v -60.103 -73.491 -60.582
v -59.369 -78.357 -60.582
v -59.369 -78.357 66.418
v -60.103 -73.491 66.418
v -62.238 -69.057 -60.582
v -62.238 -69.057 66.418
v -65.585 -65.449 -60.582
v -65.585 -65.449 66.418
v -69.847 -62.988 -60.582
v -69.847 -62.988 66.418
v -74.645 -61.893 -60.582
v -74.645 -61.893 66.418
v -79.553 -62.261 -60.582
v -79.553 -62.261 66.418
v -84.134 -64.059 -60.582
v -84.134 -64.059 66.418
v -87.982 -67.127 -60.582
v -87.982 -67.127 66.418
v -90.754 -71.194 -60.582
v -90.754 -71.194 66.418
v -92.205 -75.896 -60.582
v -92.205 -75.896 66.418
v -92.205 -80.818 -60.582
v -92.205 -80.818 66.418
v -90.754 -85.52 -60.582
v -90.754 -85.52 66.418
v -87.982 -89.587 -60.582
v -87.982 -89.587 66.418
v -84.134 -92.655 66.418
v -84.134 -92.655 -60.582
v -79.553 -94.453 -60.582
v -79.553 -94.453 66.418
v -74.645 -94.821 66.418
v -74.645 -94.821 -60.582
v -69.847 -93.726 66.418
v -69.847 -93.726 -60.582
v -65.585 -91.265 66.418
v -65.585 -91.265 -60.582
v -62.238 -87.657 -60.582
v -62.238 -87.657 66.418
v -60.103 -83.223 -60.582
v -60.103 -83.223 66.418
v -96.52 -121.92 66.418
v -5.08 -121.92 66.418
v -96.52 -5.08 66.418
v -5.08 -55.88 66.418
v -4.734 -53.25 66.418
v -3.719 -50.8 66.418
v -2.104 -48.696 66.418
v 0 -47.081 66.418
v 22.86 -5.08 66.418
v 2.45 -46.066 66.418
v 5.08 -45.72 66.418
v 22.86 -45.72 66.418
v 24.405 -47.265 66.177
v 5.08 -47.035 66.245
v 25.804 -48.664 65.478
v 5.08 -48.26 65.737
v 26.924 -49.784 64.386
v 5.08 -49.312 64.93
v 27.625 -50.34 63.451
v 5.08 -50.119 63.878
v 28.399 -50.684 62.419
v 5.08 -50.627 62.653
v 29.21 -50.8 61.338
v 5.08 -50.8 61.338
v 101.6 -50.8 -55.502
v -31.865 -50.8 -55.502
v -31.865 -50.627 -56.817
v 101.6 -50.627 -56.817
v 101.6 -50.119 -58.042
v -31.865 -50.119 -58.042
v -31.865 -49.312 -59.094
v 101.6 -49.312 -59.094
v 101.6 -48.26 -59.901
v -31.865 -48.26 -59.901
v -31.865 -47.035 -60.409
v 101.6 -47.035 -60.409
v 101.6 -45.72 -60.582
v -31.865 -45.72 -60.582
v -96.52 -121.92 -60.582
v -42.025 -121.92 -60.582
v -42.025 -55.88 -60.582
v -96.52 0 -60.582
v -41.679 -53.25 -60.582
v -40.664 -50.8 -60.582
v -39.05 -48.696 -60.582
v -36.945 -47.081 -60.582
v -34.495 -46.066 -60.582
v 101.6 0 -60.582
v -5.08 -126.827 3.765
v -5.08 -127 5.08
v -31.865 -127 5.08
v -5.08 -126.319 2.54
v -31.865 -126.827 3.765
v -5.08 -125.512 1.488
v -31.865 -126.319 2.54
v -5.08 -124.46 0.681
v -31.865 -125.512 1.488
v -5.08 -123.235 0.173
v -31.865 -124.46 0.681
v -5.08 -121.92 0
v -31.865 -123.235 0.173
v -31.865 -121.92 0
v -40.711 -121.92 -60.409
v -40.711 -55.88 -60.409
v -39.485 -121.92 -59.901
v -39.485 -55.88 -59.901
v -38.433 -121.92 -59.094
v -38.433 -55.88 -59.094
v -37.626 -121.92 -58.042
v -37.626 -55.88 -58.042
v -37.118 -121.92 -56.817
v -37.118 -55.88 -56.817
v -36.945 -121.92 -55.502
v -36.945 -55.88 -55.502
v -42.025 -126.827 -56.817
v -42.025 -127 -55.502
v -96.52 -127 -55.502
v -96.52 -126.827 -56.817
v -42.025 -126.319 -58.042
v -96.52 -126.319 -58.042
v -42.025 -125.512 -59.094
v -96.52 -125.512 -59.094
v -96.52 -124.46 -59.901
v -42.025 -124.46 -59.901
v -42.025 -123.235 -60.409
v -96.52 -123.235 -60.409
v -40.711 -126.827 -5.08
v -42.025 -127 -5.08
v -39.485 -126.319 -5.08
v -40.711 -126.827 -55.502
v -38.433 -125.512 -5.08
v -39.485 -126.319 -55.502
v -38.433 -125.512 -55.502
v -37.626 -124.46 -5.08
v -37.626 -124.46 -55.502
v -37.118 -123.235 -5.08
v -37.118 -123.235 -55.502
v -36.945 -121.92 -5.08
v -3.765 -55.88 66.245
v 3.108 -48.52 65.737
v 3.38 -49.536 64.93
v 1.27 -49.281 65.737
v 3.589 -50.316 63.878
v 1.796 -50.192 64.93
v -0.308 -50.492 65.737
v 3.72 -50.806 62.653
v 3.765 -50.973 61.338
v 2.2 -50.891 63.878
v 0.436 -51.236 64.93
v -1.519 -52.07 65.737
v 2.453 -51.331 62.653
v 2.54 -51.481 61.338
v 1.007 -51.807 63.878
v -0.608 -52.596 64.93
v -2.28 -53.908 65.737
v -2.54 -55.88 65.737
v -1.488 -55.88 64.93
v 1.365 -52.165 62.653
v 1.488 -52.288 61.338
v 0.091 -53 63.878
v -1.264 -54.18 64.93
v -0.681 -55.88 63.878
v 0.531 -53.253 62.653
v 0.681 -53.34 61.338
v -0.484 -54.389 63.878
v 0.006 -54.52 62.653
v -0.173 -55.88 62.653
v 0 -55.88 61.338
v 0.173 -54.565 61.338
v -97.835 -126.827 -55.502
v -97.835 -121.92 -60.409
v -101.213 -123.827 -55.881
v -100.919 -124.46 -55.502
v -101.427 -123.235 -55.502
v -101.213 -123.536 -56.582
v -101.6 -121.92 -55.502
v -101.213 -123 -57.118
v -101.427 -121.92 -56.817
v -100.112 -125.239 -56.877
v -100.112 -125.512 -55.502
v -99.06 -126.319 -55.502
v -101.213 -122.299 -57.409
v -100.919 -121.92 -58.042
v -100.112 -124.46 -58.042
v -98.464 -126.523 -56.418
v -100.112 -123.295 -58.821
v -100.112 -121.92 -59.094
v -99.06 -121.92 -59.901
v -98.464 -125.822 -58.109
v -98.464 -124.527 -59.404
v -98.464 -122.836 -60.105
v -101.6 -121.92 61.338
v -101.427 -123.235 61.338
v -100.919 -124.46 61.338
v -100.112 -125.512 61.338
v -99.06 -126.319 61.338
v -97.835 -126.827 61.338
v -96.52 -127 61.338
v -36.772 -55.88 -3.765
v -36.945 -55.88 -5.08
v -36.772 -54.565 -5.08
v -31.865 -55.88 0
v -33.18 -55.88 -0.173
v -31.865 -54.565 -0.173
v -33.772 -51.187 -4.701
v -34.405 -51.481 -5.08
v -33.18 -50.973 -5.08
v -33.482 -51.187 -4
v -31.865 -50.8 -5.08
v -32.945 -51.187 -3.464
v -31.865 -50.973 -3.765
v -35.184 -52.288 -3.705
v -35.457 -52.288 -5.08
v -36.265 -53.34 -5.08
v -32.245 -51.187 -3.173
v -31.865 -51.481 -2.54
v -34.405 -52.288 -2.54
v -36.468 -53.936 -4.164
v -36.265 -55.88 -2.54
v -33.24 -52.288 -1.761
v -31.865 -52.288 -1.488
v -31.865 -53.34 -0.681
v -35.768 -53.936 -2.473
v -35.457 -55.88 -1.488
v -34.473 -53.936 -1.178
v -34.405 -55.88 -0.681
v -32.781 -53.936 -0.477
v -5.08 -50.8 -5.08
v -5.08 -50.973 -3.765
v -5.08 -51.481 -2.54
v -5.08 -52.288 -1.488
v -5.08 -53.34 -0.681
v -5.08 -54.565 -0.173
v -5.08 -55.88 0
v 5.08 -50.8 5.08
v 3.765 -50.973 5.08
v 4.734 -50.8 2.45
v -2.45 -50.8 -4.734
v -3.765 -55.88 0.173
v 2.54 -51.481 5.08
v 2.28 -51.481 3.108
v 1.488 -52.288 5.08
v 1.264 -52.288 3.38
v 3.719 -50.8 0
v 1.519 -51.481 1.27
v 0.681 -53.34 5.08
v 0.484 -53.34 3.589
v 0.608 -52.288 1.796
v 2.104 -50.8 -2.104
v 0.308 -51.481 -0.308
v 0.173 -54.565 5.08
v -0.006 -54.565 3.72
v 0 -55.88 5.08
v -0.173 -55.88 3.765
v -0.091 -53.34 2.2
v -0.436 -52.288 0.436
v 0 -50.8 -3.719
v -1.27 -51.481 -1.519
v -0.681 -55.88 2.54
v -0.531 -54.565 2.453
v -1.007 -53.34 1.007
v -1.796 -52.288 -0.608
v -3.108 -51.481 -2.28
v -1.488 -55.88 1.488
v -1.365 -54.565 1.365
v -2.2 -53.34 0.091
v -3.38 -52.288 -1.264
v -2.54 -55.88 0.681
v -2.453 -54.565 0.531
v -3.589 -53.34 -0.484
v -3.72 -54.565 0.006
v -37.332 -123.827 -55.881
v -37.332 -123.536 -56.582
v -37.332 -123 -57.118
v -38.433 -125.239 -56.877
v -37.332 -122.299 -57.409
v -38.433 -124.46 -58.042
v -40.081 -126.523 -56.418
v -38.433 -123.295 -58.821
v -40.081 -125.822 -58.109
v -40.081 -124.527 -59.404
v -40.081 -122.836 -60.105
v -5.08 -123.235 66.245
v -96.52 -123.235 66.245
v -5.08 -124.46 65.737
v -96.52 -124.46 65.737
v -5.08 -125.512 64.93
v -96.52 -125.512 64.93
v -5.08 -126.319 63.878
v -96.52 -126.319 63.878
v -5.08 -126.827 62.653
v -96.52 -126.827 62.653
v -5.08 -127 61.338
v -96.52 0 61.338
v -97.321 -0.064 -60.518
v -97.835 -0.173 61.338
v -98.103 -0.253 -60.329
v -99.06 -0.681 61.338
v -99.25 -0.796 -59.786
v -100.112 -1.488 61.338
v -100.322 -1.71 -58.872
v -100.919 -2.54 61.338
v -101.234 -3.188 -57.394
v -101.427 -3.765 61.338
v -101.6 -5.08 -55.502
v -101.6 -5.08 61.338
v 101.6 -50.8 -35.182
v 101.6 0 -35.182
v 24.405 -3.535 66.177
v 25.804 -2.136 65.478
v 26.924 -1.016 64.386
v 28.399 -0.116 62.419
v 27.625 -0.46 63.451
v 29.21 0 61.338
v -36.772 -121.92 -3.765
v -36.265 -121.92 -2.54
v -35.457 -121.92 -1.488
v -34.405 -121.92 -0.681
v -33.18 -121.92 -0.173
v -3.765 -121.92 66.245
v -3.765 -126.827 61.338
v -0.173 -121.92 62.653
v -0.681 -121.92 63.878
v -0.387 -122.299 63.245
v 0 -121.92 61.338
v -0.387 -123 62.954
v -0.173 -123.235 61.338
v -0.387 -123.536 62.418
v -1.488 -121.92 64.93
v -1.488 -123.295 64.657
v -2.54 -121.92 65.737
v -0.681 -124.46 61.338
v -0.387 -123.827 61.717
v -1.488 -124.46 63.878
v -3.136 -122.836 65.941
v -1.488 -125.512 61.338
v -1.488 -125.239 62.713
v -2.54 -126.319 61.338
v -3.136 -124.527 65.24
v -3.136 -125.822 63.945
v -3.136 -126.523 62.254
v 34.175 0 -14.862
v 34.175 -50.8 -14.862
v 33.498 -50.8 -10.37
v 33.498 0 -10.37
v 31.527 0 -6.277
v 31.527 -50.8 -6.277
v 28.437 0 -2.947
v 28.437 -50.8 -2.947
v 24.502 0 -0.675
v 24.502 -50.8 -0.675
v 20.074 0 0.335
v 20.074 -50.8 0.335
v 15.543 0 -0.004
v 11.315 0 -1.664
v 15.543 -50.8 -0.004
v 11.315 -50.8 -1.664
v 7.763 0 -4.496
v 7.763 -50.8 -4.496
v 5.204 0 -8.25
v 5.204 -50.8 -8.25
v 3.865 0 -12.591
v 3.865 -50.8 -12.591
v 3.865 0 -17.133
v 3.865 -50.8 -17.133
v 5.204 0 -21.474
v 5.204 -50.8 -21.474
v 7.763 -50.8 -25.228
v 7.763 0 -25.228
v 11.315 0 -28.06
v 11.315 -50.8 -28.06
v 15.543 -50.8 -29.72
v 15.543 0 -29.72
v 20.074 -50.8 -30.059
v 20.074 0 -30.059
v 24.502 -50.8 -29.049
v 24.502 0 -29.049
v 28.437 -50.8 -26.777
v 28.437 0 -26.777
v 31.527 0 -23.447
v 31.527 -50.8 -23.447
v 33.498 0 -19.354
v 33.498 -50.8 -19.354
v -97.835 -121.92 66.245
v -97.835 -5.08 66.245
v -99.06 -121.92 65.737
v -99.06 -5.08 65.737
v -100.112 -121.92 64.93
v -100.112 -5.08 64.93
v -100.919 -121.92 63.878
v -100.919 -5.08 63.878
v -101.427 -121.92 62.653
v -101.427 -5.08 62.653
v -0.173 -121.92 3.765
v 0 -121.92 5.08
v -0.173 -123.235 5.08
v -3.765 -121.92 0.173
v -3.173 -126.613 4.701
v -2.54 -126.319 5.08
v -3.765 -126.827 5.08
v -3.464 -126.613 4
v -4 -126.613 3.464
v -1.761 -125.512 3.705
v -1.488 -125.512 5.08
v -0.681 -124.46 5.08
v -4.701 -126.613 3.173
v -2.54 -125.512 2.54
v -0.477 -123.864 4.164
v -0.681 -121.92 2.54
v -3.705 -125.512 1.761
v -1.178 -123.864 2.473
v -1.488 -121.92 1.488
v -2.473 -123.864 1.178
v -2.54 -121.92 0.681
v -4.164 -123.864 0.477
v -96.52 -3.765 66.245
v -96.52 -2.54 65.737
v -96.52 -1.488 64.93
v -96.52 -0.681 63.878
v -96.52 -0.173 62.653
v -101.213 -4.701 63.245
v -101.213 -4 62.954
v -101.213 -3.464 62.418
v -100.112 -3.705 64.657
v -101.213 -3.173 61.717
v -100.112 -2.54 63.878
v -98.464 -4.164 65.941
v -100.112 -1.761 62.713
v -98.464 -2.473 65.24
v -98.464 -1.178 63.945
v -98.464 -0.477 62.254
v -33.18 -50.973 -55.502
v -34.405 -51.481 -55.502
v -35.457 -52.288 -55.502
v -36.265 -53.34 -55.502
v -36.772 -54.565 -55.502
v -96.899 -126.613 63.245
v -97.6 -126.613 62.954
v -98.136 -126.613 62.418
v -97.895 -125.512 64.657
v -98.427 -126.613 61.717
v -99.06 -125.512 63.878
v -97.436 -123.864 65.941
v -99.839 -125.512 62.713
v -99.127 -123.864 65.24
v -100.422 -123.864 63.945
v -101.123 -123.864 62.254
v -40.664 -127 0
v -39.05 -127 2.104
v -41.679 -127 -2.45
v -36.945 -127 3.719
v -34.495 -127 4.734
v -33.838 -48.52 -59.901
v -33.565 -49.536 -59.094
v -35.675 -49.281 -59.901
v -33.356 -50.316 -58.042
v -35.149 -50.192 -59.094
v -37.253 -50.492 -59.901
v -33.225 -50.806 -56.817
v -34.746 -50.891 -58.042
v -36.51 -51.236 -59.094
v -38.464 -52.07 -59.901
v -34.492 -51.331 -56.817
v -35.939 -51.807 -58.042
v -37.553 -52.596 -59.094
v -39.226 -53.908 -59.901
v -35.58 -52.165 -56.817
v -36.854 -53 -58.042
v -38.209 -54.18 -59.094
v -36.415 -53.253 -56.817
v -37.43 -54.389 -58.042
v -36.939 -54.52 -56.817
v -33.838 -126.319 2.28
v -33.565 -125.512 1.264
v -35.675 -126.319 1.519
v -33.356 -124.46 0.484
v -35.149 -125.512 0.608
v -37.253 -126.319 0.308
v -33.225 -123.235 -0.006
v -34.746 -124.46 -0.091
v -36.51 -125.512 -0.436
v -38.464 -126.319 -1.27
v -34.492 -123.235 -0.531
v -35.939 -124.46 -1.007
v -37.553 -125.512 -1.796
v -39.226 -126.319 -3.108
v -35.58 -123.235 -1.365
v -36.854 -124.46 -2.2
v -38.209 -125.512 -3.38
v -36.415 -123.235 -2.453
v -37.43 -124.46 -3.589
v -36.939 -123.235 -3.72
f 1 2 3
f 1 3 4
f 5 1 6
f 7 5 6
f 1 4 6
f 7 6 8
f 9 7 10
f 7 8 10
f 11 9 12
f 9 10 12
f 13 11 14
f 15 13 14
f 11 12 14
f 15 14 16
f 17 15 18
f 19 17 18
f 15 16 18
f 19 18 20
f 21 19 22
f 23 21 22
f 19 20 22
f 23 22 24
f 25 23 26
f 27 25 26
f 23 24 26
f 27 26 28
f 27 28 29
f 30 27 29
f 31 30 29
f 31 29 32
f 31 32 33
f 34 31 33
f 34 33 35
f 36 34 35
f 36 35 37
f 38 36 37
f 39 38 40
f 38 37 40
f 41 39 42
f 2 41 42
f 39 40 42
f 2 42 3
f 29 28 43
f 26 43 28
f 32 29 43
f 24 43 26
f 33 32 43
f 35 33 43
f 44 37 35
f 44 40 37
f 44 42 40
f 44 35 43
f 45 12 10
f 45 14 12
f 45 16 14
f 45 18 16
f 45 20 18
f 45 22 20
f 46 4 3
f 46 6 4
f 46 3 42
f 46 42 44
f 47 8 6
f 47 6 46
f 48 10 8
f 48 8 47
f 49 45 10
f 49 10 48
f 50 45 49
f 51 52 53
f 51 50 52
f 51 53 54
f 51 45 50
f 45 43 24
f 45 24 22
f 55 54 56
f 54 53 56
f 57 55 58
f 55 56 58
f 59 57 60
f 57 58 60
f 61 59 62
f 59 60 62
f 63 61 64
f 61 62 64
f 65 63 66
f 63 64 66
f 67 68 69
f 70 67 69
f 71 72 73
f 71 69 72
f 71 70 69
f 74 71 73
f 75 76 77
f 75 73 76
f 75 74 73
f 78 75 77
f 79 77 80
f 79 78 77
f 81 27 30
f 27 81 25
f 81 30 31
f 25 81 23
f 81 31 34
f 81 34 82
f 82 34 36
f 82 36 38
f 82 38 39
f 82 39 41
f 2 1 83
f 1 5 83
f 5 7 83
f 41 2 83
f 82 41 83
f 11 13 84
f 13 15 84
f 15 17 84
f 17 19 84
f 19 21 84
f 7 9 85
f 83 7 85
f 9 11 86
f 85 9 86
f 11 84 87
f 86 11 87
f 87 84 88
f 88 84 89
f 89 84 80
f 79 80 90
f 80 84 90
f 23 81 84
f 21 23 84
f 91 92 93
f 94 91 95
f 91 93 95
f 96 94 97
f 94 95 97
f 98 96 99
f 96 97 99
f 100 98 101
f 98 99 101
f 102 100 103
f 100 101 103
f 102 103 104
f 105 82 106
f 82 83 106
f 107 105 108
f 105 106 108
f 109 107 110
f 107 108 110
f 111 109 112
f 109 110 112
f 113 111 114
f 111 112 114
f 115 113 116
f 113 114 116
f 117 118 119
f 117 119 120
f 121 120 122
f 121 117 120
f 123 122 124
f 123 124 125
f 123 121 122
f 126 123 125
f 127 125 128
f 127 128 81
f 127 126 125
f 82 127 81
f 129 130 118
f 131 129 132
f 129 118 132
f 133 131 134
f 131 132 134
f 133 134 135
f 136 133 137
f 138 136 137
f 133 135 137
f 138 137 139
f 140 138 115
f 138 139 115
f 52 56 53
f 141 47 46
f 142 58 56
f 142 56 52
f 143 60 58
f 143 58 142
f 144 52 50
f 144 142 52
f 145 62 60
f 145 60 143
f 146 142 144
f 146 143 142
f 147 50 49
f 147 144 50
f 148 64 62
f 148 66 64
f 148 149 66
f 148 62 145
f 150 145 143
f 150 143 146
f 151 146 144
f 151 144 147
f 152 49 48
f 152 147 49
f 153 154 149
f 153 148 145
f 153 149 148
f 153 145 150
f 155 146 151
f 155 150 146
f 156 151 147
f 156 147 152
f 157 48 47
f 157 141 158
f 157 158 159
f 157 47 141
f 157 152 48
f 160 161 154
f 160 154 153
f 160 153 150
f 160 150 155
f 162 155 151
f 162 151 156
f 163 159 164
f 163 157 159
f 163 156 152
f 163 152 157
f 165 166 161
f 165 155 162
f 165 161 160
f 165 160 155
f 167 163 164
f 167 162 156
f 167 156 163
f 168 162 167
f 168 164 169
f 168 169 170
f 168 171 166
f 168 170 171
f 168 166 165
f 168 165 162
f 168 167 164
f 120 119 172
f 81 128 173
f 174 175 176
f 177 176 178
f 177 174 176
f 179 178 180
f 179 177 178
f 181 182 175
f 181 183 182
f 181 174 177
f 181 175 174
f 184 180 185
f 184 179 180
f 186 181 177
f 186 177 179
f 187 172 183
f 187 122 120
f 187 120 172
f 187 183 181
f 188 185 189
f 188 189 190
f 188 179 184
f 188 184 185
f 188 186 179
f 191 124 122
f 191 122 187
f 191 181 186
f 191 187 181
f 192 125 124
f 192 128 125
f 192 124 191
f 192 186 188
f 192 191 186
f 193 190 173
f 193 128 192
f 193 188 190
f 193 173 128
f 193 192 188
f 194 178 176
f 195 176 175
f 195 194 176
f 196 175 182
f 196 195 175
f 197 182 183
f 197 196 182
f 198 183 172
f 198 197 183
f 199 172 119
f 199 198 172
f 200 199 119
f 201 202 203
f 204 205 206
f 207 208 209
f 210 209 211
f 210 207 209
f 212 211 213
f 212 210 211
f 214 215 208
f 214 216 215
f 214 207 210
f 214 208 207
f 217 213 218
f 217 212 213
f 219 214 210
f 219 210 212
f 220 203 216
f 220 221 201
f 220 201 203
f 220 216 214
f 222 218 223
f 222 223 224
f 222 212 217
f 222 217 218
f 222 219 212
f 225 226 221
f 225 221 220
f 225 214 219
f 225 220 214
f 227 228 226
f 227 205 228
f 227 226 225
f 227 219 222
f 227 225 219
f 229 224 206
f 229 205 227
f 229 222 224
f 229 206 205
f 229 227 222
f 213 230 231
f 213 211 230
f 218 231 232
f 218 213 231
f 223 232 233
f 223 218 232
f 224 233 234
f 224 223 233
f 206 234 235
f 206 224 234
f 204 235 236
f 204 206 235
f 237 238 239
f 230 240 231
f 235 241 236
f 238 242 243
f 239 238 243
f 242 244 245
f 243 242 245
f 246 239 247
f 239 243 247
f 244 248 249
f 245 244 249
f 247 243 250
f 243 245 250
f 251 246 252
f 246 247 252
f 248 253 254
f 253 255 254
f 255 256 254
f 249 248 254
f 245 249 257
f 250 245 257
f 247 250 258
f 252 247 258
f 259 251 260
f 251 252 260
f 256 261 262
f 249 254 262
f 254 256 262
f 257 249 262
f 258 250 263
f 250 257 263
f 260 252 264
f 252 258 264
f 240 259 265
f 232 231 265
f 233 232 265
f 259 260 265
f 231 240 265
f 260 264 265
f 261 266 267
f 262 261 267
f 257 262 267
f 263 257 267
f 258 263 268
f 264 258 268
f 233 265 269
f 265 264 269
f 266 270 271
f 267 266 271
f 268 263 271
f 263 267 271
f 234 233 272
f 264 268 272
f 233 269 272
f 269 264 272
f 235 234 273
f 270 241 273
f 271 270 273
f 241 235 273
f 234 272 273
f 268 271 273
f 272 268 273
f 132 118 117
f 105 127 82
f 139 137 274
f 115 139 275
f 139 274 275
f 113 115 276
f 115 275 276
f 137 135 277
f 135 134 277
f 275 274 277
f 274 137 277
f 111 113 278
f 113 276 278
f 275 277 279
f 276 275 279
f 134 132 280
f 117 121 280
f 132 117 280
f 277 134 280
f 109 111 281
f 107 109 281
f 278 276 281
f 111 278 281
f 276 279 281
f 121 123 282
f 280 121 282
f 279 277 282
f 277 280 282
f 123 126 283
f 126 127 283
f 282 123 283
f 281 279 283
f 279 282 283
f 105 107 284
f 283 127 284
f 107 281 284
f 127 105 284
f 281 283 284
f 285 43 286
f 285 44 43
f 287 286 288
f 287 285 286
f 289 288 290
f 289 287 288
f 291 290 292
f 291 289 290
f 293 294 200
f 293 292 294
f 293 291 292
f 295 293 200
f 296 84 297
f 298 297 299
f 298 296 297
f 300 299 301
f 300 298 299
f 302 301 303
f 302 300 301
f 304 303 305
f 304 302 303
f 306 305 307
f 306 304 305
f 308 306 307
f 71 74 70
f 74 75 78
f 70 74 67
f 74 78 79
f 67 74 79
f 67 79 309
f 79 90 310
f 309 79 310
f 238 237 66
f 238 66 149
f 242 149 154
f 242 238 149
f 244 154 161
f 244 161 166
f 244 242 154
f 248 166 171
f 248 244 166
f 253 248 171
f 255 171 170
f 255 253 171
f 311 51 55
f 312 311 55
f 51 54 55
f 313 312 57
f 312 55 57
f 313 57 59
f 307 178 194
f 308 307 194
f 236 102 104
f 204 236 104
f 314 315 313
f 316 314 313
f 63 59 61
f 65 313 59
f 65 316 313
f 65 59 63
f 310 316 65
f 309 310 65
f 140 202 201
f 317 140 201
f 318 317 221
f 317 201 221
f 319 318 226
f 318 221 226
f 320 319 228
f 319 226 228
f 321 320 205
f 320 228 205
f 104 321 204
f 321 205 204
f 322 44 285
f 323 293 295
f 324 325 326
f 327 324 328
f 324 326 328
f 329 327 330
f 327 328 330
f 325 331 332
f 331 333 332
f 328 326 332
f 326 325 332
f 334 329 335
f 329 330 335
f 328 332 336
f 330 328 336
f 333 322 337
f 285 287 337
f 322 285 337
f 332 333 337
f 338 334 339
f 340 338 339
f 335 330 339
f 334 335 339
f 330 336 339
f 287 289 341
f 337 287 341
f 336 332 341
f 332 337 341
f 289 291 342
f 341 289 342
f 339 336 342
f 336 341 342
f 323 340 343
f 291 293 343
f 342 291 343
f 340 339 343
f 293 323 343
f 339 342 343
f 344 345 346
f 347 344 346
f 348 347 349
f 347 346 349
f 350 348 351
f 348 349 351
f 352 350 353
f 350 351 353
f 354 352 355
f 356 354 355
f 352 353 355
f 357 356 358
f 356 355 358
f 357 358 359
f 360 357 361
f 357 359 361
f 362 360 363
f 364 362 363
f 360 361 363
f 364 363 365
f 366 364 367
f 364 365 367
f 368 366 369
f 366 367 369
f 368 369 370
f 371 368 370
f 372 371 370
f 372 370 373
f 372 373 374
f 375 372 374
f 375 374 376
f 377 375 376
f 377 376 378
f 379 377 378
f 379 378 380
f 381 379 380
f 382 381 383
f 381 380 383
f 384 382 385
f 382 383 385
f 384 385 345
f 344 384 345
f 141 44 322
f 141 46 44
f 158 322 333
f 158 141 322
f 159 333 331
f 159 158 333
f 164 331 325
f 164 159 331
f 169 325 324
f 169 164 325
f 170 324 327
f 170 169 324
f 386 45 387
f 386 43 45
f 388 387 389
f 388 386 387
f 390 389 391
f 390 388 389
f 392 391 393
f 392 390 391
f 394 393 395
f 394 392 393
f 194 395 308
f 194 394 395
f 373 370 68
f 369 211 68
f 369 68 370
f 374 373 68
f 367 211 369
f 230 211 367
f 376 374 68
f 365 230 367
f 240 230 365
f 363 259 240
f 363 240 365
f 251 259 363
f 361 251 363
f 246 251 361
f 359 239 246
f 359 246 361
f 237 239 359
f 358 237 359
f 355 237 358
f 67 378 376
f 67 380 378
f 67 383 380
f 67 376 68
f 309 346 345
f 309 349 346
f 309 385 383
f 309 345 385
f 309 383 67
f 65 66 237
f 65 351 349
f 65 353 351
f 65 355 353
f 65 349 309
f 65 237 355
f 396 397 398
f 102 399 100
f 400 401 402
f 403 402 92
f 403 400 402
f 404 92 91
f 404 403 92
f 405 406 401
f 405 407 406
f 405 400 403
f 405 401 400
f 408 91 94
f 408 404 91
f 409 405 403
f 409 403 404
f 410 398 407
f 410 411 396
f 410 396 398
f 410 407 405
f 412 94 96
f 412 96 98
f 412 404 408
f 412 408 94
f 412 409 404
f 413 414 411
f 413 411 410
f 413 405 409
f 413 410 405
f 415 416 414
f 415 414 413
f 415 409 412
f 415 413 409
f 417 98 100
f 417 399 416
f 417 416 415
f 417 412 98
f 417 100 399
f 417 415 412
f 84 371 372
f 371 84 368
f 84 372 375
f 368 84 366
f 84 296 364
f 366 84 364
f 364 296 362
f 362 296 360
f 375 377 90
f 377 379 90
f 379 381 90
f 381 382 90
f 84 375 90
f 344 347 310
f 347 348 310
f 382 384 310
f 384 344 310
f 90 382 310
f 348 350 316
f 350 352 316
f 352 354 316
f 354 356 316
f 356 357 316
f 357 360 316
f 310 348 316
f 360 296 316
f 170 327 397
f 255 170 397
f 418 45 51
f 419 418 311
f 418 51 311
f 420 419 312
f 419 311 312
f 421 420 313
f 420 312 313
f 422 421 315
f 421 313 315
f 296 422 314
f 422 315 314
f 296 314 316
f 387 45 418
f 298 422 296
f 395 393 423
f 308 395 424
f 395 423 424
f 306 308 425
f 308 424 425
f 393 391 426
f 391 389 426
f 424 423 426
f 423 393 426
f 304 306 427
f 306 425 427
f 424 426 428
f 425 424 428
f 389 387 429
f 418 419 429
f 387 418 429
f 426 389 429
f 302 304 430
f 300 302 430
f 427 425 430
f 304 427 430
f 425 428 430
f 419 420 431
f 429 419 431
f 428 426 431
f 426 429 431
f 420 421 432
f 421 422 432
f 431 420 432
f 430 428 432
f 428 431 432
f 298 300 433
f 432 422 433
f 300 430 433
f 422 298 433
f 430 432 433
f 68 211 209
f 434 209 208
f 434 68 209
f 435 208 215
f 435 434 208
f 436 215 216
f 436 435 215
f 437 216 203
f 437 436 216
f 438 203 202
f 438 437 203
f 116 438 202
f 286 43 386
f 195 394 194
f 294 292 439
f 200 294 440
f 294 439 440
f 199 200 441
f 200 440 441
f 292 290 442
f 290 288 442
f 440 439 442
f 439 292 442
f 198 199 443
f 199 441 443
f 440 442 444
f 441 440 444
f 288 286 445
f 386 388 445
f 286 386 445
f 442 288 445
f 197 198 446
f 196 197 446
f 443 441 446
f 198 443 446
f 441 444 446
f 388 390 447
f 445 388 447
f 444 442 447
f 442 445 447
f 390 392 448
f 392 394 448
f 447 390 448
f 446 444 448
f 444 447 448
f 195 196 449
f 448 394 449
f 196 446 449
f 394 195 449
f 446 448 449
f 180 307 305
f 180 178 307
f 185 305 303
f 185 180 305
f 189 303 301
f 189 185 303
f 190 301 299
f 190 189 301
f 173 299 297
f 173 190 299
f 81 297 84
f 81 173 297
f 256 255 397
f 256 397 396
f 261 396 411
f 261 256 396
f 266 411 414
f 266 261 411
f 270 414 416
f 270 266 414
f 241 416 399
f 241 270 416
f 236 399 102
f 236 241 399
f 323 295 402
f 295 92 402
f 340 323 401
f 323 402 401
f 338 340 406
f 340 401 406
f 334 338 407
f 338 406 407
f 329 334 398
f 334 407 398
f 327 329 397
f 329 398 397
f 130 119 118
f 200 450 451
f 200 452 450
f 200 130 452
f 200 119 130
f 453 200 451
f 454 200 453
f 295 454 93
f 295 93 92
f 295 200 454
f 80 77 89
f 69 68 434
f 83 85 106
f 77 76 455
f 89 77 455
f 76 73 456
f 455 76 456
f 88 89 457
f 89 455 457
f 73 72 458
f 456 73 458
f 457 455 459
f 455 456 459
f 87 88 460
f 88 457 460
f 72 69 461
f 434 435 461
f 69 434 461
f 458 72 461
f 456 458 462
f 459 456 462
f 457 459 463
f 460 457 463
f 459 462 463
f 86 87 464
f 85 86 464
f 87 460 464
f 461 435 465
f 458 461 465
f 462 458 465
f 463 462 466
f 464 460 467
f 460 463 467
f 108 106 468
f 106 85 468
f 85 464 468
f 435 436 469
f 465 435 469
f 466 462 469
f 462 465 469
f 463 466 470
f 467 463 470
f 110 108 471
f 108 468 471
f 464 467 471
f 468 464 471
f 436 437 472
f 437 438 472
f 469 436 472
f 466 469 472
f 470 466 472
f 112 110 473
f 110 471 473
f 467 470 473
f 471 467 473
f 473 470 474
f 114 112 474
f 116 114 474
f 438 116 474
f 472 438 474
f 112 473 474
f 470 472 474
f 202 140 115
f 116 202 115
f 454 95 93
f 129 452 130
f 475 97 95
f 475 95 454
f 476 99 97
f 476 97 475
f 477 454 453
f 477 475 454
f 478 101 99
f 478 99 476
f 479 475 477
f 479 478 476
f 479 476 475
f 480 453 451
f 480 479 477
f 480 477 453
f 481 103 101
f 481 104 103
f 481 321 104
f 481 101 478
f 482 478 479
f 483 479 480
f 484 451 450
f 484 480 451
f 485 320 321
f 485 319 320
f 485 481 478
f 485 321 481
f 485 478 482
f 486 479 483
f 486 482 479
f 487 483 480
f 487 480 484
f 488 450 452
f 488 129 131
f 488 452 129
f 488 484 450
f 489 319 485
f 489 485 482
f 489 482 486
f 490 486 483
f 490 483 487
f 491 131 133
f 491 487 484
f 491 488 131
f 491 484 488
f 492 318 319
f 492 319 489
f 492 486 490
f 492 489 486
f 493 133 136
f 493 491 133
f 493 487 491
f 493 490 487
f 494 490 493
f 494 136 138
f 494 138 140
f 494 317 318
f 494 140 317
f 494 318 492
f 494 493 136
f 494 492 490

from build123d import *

# Parameters (mm, degrees)
F0_W     = 203.2
F0_H     = 127
F1_DEPTH = 127
F3_DEPTH = 76.2
F4_SIZE2 = 101.6
F4_SIZE  = 76.2
F5_R     = 5.08
F6_R     = 15.24
F7_DEPTH = 50.8
F8_R     = 16.51
F9_DEPTH = 127


with BuildPart() as f1:
    # F0 (on Front) → F1 (new body)
    with BuildSketch(Plane.XZ):
        with Locations((0, 2.9180156587)):
            Rectangle(F0_W, F0_H)
    extrude(amount=F1_DEPTH)

    # F2 (on face) → F3 (cut)
    with BuildSketch(Plane.XZ.offset(127)):
        Polygon((-36.9453281164, 0), (-36.9453281164, -60.5819843413), (101.6, -60.5819843413), (101.6, 66.4180156587), (0, 66.4180156587), (0, 0), align=None)
    extrude(amount=-F3_DEPTH, mode=Mode.SUBTRACT)

    # F4
    f4_edges = [f1.edges().sort_by_distance(p)[0] for p in [
        (101.6, -25.4, 66.418016),
    ]]
    f4_side = f1.faces().sort_by_distance((-21.771429, -52.614286, 66.418016))[0]
    chamfer(f4_edges, length=F4_SIZE, length2=F4_SIZE2, reference=f4_side)

    # F5
    f5_edges = [f1.edges().sort_by_distance(p)[0] for p in [
        (-38.1, 0, 66.418016),
        (25.4, -25.4, 66.418016),
        (-101.6, -63.5, 66.418016),
        (12.7, -50.8, 66.418016),
        (-50.8, -127, 66.418016),
        (0, -88.9, 66.418016),
        (0, -88.9, 0),
        (0, -127, 33.209008),
        (0, -50.8, 33.209008),
        (-69.272664, -127, -60.581984),
        (-101.6, -127, 2.918016),
        (-18.472664, -127, 0),
        (-36.945328, -127, -30.290992),
        (-36.945328, -88.9, 0),
        (-36.945328, -88.9, -60.581984),
        (-36.945328, -50.8, -30.290992),
        (-101.6, -63.5, -60.581984),
        (-101.6, 0, 2.918016),
        (32.327336, -50.8, -60.581984),
        (-18.472664, -50.8, 0),
    ]]
    fillet(f5_edges, radius=F5_R)

    # F6 (on face) → F7 (cut, through all)
    with BuildSketch(Plane.XZ.offset(50.8)):
        with Locations((18.9346718836, -14.8619843413)):
            Circle(F6_R)
    extrude(amount=-F7_DEPTH, mode=Mode.SUBTRACT)

    # F8 (on face) → F9 (cut, through all)
    with BuildSketch(Plane.XY.offset(66.4180156587)):
        with Locations((-75.8790969849, -78.356936574)):
            Circle(F8_R)
    extrude(amount=-F9_DEPTH, mode=Mode.SUBTRACT)


solid = f1.part
